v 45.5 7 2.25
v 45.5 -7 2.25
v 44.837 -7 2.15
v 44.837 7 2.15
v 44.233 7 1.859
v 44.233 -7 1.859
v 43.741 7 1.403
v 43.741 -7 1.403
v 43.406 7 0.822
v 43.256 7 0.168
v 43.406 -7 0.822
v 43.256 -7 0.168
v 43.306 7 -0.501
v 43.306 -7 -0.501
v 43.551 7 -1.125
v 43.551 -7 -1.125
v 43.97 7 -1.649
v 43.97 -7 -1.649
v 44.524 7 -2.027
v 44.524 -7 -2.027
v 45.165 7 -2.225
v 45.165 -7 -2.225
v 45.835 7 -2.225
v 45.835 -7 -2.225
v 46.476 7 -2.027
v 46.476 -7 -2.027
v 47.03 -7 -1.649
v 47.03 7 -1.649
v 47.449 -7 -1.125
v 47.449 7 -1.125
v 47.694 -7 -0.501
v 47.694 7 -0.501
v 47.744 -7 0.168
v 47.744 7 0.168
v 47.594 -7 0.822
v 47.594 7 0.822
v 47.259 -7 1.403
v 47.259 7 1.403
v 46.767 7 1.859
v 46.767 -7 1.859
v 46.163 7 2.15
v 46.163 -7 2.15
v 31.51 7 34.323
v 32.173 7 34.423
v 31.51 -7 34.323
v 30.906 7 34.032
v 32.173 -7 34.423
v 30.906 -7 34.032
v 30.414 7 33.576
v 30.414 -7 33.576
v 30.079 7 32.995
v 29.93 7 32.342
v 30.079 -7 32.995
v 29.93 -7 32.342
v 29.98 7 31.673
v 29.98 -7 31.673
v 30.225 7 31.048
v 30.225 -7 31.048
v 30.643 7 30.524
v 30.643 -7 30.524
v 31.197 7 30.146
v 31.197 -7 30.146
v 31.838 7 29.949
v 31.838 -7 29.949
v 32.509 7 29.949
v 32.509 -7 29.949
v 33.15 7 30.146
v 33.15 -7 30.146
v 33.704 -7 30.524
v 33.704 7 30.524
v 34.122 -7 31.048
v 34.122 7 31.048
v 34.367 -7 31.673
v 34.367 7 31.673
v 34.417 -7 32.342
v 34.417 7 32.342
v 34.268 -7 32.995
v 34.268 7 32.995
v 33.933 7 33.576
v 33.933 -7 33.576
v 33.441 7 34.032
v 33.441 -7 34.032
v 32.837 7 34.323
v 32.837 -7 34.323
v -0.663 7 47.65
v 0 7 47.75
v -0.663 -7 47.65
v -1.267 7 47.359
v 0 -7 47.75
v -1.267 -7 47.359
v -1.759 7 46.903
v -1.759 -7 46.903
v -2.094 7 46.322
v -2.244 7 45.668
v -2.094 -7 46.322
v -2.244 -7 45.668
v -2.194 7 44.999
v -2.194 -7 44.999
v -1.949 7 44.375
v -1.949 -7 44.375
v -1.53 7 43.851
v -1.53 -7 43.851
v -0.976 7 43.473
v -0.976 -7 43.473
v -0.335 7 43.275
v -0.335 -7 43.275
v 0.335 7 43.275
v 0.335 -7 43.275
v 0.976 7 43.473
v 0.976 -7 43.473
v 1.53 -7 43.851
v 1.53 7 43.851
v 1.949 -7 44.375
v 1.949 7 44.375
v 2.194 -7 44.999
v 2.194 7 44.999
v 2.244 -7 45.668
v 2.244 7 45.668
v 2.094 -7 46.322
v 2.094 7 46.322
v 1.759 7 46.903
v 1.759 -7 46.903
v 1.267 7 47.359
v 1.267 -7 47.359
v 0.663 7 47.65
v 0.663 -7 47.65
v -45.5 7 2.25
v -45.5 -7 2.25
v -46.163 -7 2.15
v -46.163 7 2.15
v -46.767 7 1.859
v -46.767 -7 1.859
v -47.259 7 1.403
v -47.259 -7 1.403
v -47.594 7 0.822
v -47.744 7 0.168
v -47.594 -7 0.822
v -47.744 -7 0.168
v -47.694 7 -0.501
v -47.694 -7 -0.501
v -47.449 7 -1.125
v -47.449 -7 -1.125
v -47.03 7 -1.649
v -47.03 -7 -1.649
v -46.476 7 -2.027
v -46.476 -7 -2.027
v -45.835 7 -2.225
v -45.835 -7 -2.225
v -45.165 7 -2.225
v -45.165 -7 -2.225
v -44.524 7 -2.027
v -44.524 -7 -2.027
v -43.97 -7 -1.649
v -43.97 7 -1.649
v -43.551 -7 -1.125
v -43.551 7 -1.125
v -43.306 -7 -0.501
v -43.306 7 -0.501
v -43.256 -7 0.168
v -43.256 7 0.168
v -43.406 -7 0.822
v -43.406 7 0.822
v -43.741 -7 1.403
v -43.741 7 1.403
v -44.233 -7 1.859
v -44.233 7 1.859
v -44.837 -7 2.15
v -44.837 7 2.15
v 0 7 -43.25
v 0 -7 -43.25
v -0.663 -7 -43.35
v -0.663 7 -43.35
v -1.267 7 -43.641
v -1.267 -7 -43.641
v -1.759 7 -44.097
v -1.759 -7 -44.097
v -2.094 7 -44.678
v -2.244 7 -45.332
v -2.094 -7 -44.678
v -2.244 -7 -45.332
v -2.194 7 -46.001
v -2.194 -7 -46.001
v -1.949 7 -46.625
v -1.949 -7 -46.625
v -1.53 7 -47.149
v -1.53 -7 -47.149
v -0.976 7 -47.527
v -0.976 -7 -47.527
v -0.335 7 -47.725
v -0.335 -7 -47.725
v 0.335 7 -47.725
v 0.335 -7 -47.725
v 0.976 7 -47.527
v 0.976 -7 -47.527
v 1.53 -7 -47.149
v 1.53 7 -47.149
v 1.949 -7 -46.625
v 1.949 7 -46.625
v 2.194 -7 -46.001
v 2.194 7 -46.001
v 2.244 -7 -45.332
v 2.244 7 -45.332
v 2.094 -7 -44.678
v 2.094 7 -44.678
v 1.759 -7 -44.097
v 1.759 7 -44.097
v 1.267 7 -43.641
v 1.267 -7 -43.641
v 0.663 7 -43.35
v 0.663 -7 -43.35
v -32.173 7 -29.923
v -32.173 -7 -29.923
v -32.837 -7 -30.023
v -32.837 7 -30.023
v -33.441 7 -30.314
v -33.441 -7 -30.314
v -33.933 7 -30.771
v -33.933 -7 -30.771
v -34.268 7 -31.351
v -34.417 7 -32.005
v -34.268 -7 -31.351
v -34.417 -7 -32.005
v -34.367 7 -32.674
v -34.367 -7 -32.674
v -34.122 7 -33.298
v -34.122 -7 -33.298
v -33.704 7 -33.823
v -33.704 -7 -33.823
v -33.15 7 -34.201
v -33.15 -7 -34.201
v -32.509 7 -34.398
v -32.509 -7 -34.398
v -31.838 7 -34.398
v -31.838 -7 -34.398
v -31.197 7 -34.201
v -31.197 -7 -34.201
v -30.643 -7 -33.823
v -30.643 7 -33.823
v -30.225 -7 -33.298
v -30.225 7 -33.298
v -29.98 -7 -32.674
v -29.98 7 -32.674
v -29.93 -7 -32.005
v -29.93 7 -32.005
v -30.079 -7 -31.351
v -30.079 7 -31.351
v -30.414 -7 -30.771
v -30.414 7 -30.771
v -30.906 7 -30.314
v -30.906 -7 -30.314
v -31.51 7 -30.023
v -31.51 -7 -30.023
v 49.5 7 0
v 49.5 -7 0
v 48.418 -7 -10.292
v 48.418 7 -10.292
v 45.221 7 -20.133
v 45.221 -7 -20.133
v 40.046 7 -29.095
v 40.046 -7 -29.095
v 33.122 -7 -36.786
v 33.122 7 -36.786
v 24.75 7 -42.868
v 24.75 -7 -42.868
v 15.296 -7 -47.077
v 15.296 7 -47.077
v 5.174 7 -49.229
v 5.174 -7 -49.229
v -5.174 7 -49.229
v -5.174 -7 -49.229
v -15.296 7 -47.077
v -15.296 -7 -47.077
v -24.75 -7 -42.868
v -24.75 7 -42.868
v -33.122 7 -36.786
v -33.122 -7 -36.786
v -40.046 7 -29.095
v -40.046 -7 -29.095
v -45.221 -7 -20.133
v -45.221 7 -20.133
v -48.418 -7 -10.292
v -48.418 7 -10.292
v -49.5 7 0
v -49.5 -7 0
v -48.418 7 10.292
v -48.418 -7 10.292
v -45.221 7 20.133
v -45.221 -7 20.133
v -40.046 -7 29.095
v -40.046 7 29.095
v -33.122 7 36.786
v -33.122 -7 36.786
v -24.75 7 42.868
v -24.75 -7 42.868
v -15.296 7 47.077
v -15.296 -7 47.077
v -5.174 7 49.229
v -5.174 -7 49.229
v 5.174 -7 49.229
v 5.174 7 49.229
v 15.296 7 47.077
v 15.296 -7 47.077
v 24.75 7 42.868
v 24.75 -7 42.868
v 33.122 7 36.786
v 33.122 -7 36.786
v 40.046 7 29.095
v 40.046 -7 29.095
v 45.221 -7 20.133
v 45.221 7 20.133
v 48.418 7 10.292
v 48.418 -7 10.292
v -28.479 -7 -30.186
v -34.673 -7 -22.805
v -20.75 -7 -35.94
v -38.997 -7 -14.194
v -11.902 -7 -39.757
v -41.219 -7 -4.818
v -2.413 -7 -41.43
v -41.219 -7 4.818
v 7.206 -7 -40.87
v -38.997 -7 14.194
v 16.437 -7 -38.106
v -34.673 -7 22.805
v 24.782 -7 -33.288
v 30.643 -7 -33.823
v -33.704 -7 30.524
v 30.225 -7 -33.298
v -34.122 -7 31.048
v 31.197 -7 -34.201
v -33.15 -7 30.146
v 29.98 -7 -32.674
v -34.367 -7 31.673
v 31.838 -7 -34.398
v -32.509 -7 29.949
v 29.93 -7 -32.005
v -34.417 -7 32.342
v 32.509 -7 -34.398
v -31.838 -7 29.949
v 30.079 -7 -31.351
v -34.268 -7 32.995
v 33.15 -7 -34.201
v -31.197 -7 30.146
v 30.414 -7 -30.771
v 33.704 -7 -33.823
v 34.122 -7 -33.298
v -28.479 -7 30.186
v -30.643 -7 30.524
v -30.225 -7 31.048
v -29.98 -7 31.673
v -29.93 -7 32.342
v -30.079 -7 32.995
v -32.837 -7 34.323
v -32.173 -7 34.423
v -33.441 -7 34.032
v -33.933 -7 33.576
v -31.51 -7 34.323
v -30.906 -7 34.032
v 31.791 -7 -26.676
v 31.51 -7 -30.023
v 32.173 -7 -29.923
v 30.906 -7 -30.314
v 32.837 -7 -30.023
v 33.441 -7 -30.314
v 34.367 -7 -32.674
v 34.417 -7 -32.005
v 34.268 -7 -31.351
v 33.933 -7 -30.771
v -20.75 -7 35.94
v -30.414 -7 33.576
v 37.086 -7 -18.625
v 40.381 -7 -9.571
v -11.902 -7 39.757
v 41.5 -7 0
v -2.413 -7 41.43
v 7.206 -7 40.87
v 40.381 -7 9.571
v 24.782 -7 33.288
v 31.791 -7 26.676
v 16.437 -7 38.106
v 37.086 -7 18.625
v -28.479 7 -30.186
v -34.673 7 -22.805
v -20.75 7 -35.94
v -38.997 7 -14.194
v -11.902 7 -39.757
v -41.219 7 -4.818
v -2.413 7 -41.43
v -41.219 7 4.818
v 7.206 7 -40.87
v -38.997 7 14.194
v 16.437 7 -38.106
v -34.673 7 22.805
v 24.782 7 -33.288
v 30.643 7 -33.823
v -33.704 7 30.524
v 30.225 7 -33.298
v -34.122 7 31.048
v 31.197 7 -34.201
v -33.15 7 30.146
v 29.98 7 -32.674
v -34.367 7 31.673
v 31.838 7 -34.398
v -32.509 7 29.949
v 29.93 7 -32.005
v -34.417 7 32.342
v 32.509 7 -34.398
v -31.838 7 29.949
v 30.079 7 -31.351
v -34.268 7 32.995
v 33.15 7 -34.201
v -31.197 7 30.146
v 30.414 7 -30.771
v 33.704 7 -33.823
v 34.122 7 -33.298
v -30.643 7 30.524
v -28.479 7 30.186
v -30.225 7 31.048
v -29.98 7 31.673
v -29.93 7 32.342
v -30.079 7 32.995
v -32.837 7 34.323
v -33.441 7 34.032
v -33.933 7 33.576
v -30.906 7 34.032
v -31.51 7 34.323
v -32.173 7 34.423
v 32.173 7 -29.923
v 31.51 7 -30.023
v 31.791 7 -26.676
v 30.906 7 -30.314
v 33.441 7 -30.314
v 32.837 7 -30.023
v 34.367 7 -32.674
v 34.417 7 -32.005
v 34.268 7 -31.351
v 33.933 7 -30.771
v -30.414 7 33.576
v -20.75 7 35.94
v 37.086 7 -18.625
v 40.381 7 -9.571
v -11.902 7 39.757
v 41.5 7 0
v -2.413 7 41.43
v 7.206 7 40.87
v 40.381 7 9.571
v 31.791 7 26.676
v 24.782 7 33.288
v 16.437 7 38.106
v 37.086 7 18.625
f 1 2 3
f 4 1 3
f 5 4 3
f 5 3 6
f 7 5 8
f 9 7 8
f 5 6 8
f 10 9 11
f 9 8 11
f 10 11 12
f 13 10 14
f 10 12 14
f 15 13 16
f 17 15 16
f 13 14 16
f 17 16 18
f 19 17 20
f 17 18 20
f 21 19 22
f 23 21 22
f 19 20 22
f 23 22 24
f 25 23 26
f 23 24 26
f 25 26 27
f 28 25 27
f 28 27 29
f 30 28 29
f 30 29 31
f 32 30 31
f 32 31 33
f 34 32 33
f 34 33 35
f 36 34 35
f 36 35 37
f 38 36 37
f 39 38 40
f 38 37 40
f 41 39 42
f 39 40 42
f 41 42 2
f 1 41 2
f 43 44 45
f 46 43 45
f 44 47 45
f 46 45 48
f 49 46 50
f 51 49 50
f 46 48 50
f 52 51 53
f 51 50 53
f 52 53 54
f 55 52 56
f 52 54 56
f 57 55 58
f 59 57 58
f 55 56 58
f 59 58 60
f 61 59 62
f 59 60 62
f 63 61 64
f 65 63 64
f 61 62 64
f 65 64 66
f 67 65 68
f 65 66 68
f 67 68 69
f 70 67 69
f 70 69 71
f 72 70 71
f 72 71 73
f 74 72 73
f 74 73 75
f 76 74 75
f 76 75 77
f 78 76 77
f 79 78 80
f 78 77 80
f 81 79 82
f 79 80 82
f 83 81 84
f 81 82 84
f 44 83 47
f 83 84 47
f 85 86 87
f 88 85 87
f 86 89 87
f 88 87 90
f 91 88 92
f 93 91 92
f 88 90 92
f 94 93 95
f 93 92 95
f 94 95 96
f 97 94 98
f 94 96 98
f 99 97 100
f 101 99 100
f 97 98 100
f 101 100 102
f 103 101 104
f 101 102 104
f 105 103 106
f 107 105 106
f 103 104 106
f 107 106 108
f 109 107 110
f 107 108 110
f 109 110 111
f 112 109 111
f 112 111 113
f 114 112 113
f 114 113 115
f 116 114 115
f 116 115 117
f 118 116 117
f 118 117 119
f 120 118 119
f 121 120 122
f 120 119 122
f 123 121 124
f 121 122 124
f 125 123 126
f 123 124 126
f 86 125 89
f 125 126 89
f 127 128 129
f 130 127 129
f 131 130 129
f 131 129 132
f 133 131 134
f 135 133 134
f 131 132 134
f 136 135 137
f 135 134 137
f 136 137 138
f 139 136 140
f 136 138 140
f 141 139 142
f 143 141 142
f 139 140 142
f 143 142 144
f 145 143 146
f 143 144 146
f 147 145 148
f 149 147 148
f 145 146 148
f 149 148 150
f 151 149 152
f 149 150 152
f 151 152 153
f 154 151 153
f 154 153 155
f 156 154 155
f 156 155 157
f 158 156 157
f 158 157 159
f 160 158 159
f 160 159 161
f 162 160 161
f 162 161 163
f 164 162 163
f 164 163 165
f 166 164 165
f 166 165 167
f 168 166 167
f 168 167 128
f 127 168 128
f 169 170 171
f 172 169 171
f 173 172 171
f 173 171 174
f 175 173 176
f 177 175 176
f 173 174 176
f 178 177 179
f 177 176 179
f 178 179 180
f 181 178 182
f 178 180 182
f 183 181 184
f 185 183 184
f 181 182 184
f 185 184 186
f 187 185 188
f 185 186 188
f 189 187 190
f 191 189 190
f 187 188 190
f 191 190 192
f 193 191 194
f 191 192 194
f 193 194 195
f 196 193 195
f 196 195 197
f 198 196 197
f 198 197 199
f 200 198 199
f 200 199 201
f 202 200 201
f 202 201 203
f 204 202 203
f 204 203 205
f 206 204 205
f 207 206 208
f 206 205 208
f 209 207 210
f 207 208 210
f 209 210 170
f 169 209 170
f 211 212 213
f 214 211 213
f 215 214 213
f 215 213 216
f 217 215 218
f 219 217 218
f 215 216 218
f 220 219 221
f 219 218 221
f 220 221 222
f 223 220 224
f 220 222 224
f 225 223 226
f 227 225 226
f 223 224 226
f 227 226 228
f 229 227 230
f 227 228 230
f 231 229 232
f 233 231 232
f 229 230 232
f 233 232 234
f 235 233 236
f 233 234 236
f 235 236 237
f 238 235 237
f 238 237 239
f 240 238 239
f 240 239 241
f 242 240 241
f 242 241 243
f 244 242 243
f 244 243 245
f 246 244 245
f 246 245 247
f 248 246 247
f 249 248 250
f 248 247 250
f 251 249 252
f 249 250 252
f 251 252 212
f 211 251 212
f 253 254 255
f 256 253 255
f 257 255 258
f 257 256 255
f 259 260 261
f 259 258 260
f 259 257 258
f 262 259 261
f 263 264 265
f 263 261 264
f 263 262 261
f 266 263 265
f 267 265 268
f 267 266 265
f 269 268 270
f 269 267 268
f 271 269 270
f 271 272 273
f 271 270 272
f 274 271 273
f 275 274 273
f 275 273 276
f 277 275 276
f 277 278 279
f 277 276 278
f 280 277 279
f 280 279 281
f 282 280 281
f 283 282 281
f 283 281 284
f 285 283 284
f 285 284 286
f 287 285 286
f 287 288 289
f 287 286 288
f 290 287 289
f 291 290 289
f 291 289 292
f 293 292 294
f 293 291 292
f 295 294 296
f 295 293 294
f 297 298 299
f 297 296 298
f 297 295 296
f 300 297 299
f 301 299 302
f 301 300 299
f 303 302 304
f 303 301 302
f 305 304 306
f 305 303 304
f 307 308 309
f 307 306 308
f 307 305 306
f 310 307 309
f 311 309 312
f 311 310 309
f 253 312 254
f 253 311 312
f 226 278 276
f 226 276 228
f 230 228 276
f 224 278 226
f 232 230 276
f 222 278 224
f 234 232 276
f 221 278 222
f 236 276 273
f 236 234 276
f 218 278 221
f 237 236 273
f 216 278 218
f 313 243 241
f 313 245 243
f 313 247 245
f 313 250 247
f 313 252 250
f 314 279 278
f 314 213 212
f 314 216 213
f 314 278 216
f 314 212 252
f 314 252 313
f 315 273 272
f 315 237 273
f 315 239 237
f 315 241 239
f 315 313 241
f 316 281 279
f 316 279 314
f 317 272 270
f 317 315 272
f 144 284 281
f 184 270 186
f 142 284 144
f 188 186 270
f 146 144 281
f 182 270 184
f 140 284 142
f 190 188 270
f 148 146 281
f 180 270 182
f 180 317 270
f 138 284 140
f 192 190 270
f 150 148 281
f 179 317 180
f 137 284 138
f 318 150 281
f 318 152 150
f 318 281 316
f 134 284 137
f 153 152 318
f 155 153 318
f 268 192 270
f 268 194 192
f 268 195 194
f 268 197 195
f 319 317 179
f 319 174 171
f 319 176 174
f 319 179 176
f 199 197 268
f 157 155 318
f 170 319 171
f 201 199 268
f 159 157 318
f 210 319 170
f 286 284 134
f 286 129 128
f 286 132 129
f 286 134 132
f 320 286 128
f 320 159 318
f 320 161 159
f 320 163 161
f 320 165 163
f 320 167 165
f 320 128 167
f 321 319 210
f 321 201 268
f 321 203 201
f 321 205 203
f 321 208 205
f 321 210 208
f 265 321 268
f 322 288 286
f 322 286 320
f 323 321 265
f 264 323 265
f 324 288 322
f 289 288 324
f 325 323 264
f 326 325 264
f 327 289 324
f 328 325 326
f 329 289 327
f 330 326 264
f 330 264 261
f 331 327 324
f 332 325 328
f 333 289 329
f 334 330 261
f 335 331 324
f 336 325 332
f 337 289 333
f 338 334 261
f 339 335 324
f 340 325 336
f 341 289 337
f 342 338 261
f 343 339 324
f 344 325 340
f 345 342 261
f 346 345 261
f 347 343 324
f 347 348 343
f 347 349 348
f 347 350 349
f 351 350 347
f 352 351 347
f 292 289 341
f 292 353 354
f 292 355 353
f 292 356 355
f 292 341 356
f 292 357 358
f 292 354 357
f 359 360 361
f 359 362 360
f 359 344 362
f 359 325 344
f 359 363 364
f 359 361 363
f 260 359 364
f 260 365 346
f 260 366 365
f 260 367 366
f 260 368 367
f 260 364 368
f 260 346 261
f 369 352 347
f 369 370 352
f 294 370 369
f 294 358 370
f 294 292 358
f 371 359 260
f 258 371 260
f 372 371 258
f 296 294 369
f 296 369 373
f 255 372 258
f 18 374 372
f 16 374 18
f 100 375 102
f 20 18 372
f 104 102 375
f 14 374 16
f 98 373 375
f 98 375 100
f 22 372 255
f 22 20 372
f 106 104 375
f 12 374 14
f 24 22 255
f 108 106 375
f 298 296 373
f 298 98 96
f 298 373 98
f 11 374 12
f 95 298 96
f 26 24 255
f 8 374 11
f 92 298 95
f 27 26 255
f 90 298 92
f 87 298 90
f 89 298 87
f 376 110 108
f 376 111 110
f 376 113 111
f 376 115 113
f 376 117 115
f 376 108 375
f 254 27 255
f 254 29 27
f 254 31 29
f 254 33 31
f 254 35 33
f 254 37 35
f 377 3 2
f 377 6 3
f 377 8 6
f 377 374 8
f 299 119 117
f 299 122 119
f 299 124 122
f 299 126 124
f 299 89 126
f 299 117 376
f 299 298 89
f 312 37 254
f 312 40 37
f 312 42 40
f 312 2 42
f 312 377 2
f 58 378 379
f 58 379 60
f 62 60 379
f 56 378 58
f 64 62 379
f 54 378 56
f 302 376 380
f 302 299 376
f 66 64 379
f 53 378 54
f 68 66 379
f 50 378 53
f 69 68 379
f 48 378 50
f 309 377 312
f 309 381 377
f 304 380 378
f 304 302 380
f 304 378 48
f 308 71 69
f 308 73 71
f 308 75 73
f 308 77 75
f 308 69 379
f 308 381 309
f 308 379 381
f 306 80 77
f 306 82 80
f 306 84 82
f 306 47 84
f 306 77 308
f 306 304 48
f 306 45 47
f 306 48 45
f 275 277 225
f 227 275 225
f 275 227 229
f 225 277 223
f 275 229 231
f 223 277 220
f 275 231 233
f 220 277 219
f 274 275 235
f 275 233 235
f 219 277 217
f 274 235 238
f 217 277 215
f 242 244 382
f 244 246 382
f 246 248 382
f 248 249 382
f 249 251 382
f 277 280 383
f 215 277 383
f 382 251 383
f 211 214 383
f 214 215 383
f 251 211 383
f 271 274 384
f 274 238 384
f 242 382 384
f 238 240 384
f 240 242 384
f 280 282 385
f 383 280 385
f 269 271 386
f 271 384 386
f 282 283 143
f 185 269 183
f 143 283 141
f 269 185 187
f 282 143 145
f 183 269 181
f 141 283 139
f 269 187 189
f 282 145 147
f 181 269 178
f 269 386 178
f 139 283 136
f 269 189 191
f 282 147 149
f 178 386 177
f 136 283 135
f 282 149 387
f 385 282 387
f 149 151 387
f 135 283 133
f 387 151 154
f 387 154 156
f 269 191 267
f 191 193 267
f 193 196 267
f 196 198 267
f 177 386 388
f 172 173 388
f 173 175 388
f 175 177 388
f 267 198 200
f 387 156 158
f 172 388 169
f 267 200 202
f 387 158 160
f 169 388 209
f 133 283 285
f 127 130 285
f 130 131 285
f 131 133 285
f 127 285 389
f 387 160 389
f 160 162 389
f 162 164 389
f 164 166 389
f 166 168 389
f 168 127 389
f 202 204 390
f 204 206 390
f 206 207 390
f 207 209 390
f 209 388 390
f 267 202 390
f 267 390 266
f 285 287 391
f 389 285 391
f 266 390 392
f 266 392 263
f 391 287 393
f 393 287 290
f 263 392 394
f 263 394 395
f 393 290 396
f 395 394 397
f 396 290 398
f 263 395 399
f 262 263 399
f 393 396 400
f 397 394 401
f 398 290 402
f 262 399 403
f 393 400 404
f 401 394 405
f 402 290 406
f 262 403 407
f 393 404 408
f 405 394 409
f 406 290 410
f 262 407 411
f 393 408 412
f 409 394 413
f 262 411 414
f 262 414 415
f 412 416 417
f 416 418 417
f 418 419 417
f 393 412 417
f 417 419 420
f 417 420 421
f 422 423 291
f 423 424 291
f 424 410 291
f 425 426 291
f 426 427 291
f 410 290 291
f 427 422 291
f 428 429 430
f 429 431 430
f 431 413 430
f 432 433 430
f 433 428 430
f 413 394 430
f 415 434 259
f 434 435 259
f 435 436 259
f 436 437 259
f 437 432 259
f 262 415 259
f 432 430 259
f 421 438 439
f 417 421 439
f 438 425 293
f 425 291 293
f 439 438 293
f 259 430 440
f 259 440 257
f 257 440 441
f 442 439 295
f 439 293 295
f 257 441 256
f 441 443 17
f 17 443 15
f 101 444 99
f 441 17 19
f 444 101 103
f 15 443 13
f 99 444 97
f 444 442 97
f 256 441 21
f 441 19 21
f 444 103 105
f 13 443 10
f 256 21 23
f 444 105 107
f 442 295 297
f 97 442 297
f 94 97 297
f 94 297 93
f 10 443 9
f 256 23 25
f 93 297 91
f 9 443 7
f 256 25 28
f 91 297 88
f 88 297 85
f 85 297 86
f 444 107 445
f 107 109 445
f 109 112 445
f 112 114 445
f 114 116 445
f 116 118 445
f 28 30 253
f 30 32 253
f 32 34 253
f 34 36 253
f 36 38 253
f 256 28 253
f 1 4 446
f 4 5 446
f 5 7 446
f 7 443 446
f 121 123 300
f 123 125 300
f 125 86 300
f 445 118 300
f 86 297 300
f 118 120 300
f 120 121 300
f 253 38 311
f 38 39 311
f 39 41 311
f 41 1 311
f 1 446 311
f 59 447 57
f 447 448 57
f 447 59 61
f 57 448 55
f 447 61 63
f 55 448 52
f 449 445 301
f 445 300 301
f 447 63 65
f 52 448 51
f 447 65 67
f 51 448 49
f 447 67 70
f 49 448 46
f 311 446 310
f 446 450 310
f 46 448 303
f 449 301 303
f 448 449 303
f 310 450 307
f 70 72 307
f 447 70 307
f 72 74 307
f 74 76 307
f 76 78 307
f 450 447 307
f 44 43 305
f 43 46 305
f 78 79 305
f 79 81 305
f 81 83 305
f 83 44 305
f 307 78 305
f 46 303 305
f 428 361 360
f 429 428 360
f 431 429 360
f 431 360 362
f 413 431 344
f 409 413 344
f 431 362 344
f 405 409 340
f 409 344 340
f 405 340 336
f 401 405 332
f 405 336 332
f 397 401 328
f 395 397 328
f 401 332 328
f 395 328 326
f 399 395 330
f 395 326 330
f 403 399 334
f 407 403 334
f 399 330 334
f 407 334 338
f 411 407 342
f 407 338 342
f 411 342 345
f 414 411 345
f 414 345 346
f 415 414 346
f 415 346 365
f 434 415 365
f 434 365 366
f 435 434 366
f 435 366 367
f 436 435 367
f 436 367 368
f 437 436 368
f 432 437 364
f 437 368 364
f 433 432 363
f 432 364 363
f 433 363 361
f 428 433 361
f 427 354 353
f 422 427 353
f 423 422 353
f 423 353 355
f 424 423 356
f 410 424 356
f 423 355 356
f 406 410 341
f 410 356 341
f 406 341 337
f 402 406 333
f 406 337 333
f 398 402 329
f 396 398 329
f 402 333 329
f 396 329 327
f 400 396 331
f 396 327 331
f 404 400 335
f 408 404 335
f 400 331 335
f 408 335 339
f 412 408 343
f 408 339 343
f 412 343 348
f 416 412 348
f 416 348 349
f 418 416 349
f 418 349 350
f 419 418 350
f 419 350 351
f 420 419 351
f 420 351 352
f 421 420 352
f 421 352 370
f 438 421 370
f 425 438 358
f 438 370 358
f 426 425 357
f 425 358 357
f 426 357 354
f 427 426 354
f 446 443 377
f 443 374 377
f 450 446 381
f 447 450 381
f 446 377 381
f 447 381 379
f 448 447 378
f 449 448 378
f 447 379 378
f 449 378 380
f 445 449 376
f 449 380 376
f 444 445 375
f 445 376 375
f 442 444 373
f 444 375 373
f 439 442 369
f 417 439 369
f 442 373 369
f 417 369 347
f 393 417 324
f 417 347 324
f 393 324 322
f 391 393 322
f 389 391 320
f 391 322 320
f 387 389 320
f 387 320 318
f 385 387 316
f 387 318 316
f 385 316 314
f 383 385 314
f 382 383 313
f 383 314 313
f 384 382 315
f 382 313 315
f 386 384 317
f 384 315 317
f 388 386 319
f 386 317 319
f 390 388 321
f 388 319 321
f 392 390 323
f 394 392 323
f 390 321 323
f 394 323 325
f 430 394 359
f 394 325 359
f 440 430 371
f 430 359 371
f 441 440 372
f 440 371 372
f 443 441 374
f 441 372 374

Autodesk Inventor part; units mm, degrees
ref_plane "YZ Plane" through (0, 0, 0) normal (1, 0, 0) x (0, 1, 0)
ref_plane "XZ Plane" through (0, 0, 0) normal (0, 1, 0) x (-1, 0, 0)
ref_plane "XY Plane" through (0, 0, 0) normal (0, 0, 1) x (1, 0, 0)
sketch "Sketch1" plane through (0, 0, 0) normal (0, 0, 1) x (1, 0, 0)
  line L0 (0, 9.8) -> (0, -9.8) construction
  line L1 (-9.9, 0) -> (59.4, 0) construction
  line L2 (41.5, 7) -> (41.5, -7)
  line L3 (41.5, -7) -> (49.5, -7)
  line L4 (49.5, -7) -> (49.5, 7)
  line L5 (49.5, 7) -> (41.5, 7)
  line L6 (45.5, 7) -> (45.5, -7) construction
  point P0 (0, 0)
  dimension "d0" = 45.5
  dimension "d1" = 4
  dimension "d2" = 14
revolve "Revolution1" add sketch "Sketch1" angle 360 about axis through (0, 0, 0) along (0, -1, 0)
sketch "Sketch2" plane through (0, 7, 0) normal (0, 1, 0) x (1, 0, 0)
  line L0 (0, 69.3) -> (0, -69.3) construction
  line L1 (69.3, 0) -> (-69.3, 0) construction
  circle A0 centre (0, 0) radius 45.5 construction
  circle A1 centre (0, 0) radius 49.5 construction
  circle A2 centre (0, 0) radius 41.5 construction
  point P0 (-45.5, 0)
  point P1 (-32.1734, -32.1734)
  point P2 (0, -45.5)
  point P3 (32.1734, -32.1734)
  point P4 (45.5, 0)
  point P5 (32.1734, 32.1734)
  point P6 (0, 45.5)
  point P7 (-32.1734, 32.1734)
  dimension "d4" = 4
  dimension "d5" = 4
  dimension "d8" = 360
hole "Hole1" at (-45.5, 7, 0) at (-32.1734, 7, 32.1734) at (0, 7, 45.5) at (32.1734, 7, 32.1734) at (45.5, 7, 0) at (32.1734, 7, -32.1734) at (0, 7, -45.5) at (-32.1734, 7, -32.1734) direction (0, -1, 0) diameter 4.5 end through all clearance for "Flat Head Machine Screw" size "M4" standard "Ansi Metric M Profile"
equation "\"d4\" = d5"
properties part number "Adapter_bearing_joint"
